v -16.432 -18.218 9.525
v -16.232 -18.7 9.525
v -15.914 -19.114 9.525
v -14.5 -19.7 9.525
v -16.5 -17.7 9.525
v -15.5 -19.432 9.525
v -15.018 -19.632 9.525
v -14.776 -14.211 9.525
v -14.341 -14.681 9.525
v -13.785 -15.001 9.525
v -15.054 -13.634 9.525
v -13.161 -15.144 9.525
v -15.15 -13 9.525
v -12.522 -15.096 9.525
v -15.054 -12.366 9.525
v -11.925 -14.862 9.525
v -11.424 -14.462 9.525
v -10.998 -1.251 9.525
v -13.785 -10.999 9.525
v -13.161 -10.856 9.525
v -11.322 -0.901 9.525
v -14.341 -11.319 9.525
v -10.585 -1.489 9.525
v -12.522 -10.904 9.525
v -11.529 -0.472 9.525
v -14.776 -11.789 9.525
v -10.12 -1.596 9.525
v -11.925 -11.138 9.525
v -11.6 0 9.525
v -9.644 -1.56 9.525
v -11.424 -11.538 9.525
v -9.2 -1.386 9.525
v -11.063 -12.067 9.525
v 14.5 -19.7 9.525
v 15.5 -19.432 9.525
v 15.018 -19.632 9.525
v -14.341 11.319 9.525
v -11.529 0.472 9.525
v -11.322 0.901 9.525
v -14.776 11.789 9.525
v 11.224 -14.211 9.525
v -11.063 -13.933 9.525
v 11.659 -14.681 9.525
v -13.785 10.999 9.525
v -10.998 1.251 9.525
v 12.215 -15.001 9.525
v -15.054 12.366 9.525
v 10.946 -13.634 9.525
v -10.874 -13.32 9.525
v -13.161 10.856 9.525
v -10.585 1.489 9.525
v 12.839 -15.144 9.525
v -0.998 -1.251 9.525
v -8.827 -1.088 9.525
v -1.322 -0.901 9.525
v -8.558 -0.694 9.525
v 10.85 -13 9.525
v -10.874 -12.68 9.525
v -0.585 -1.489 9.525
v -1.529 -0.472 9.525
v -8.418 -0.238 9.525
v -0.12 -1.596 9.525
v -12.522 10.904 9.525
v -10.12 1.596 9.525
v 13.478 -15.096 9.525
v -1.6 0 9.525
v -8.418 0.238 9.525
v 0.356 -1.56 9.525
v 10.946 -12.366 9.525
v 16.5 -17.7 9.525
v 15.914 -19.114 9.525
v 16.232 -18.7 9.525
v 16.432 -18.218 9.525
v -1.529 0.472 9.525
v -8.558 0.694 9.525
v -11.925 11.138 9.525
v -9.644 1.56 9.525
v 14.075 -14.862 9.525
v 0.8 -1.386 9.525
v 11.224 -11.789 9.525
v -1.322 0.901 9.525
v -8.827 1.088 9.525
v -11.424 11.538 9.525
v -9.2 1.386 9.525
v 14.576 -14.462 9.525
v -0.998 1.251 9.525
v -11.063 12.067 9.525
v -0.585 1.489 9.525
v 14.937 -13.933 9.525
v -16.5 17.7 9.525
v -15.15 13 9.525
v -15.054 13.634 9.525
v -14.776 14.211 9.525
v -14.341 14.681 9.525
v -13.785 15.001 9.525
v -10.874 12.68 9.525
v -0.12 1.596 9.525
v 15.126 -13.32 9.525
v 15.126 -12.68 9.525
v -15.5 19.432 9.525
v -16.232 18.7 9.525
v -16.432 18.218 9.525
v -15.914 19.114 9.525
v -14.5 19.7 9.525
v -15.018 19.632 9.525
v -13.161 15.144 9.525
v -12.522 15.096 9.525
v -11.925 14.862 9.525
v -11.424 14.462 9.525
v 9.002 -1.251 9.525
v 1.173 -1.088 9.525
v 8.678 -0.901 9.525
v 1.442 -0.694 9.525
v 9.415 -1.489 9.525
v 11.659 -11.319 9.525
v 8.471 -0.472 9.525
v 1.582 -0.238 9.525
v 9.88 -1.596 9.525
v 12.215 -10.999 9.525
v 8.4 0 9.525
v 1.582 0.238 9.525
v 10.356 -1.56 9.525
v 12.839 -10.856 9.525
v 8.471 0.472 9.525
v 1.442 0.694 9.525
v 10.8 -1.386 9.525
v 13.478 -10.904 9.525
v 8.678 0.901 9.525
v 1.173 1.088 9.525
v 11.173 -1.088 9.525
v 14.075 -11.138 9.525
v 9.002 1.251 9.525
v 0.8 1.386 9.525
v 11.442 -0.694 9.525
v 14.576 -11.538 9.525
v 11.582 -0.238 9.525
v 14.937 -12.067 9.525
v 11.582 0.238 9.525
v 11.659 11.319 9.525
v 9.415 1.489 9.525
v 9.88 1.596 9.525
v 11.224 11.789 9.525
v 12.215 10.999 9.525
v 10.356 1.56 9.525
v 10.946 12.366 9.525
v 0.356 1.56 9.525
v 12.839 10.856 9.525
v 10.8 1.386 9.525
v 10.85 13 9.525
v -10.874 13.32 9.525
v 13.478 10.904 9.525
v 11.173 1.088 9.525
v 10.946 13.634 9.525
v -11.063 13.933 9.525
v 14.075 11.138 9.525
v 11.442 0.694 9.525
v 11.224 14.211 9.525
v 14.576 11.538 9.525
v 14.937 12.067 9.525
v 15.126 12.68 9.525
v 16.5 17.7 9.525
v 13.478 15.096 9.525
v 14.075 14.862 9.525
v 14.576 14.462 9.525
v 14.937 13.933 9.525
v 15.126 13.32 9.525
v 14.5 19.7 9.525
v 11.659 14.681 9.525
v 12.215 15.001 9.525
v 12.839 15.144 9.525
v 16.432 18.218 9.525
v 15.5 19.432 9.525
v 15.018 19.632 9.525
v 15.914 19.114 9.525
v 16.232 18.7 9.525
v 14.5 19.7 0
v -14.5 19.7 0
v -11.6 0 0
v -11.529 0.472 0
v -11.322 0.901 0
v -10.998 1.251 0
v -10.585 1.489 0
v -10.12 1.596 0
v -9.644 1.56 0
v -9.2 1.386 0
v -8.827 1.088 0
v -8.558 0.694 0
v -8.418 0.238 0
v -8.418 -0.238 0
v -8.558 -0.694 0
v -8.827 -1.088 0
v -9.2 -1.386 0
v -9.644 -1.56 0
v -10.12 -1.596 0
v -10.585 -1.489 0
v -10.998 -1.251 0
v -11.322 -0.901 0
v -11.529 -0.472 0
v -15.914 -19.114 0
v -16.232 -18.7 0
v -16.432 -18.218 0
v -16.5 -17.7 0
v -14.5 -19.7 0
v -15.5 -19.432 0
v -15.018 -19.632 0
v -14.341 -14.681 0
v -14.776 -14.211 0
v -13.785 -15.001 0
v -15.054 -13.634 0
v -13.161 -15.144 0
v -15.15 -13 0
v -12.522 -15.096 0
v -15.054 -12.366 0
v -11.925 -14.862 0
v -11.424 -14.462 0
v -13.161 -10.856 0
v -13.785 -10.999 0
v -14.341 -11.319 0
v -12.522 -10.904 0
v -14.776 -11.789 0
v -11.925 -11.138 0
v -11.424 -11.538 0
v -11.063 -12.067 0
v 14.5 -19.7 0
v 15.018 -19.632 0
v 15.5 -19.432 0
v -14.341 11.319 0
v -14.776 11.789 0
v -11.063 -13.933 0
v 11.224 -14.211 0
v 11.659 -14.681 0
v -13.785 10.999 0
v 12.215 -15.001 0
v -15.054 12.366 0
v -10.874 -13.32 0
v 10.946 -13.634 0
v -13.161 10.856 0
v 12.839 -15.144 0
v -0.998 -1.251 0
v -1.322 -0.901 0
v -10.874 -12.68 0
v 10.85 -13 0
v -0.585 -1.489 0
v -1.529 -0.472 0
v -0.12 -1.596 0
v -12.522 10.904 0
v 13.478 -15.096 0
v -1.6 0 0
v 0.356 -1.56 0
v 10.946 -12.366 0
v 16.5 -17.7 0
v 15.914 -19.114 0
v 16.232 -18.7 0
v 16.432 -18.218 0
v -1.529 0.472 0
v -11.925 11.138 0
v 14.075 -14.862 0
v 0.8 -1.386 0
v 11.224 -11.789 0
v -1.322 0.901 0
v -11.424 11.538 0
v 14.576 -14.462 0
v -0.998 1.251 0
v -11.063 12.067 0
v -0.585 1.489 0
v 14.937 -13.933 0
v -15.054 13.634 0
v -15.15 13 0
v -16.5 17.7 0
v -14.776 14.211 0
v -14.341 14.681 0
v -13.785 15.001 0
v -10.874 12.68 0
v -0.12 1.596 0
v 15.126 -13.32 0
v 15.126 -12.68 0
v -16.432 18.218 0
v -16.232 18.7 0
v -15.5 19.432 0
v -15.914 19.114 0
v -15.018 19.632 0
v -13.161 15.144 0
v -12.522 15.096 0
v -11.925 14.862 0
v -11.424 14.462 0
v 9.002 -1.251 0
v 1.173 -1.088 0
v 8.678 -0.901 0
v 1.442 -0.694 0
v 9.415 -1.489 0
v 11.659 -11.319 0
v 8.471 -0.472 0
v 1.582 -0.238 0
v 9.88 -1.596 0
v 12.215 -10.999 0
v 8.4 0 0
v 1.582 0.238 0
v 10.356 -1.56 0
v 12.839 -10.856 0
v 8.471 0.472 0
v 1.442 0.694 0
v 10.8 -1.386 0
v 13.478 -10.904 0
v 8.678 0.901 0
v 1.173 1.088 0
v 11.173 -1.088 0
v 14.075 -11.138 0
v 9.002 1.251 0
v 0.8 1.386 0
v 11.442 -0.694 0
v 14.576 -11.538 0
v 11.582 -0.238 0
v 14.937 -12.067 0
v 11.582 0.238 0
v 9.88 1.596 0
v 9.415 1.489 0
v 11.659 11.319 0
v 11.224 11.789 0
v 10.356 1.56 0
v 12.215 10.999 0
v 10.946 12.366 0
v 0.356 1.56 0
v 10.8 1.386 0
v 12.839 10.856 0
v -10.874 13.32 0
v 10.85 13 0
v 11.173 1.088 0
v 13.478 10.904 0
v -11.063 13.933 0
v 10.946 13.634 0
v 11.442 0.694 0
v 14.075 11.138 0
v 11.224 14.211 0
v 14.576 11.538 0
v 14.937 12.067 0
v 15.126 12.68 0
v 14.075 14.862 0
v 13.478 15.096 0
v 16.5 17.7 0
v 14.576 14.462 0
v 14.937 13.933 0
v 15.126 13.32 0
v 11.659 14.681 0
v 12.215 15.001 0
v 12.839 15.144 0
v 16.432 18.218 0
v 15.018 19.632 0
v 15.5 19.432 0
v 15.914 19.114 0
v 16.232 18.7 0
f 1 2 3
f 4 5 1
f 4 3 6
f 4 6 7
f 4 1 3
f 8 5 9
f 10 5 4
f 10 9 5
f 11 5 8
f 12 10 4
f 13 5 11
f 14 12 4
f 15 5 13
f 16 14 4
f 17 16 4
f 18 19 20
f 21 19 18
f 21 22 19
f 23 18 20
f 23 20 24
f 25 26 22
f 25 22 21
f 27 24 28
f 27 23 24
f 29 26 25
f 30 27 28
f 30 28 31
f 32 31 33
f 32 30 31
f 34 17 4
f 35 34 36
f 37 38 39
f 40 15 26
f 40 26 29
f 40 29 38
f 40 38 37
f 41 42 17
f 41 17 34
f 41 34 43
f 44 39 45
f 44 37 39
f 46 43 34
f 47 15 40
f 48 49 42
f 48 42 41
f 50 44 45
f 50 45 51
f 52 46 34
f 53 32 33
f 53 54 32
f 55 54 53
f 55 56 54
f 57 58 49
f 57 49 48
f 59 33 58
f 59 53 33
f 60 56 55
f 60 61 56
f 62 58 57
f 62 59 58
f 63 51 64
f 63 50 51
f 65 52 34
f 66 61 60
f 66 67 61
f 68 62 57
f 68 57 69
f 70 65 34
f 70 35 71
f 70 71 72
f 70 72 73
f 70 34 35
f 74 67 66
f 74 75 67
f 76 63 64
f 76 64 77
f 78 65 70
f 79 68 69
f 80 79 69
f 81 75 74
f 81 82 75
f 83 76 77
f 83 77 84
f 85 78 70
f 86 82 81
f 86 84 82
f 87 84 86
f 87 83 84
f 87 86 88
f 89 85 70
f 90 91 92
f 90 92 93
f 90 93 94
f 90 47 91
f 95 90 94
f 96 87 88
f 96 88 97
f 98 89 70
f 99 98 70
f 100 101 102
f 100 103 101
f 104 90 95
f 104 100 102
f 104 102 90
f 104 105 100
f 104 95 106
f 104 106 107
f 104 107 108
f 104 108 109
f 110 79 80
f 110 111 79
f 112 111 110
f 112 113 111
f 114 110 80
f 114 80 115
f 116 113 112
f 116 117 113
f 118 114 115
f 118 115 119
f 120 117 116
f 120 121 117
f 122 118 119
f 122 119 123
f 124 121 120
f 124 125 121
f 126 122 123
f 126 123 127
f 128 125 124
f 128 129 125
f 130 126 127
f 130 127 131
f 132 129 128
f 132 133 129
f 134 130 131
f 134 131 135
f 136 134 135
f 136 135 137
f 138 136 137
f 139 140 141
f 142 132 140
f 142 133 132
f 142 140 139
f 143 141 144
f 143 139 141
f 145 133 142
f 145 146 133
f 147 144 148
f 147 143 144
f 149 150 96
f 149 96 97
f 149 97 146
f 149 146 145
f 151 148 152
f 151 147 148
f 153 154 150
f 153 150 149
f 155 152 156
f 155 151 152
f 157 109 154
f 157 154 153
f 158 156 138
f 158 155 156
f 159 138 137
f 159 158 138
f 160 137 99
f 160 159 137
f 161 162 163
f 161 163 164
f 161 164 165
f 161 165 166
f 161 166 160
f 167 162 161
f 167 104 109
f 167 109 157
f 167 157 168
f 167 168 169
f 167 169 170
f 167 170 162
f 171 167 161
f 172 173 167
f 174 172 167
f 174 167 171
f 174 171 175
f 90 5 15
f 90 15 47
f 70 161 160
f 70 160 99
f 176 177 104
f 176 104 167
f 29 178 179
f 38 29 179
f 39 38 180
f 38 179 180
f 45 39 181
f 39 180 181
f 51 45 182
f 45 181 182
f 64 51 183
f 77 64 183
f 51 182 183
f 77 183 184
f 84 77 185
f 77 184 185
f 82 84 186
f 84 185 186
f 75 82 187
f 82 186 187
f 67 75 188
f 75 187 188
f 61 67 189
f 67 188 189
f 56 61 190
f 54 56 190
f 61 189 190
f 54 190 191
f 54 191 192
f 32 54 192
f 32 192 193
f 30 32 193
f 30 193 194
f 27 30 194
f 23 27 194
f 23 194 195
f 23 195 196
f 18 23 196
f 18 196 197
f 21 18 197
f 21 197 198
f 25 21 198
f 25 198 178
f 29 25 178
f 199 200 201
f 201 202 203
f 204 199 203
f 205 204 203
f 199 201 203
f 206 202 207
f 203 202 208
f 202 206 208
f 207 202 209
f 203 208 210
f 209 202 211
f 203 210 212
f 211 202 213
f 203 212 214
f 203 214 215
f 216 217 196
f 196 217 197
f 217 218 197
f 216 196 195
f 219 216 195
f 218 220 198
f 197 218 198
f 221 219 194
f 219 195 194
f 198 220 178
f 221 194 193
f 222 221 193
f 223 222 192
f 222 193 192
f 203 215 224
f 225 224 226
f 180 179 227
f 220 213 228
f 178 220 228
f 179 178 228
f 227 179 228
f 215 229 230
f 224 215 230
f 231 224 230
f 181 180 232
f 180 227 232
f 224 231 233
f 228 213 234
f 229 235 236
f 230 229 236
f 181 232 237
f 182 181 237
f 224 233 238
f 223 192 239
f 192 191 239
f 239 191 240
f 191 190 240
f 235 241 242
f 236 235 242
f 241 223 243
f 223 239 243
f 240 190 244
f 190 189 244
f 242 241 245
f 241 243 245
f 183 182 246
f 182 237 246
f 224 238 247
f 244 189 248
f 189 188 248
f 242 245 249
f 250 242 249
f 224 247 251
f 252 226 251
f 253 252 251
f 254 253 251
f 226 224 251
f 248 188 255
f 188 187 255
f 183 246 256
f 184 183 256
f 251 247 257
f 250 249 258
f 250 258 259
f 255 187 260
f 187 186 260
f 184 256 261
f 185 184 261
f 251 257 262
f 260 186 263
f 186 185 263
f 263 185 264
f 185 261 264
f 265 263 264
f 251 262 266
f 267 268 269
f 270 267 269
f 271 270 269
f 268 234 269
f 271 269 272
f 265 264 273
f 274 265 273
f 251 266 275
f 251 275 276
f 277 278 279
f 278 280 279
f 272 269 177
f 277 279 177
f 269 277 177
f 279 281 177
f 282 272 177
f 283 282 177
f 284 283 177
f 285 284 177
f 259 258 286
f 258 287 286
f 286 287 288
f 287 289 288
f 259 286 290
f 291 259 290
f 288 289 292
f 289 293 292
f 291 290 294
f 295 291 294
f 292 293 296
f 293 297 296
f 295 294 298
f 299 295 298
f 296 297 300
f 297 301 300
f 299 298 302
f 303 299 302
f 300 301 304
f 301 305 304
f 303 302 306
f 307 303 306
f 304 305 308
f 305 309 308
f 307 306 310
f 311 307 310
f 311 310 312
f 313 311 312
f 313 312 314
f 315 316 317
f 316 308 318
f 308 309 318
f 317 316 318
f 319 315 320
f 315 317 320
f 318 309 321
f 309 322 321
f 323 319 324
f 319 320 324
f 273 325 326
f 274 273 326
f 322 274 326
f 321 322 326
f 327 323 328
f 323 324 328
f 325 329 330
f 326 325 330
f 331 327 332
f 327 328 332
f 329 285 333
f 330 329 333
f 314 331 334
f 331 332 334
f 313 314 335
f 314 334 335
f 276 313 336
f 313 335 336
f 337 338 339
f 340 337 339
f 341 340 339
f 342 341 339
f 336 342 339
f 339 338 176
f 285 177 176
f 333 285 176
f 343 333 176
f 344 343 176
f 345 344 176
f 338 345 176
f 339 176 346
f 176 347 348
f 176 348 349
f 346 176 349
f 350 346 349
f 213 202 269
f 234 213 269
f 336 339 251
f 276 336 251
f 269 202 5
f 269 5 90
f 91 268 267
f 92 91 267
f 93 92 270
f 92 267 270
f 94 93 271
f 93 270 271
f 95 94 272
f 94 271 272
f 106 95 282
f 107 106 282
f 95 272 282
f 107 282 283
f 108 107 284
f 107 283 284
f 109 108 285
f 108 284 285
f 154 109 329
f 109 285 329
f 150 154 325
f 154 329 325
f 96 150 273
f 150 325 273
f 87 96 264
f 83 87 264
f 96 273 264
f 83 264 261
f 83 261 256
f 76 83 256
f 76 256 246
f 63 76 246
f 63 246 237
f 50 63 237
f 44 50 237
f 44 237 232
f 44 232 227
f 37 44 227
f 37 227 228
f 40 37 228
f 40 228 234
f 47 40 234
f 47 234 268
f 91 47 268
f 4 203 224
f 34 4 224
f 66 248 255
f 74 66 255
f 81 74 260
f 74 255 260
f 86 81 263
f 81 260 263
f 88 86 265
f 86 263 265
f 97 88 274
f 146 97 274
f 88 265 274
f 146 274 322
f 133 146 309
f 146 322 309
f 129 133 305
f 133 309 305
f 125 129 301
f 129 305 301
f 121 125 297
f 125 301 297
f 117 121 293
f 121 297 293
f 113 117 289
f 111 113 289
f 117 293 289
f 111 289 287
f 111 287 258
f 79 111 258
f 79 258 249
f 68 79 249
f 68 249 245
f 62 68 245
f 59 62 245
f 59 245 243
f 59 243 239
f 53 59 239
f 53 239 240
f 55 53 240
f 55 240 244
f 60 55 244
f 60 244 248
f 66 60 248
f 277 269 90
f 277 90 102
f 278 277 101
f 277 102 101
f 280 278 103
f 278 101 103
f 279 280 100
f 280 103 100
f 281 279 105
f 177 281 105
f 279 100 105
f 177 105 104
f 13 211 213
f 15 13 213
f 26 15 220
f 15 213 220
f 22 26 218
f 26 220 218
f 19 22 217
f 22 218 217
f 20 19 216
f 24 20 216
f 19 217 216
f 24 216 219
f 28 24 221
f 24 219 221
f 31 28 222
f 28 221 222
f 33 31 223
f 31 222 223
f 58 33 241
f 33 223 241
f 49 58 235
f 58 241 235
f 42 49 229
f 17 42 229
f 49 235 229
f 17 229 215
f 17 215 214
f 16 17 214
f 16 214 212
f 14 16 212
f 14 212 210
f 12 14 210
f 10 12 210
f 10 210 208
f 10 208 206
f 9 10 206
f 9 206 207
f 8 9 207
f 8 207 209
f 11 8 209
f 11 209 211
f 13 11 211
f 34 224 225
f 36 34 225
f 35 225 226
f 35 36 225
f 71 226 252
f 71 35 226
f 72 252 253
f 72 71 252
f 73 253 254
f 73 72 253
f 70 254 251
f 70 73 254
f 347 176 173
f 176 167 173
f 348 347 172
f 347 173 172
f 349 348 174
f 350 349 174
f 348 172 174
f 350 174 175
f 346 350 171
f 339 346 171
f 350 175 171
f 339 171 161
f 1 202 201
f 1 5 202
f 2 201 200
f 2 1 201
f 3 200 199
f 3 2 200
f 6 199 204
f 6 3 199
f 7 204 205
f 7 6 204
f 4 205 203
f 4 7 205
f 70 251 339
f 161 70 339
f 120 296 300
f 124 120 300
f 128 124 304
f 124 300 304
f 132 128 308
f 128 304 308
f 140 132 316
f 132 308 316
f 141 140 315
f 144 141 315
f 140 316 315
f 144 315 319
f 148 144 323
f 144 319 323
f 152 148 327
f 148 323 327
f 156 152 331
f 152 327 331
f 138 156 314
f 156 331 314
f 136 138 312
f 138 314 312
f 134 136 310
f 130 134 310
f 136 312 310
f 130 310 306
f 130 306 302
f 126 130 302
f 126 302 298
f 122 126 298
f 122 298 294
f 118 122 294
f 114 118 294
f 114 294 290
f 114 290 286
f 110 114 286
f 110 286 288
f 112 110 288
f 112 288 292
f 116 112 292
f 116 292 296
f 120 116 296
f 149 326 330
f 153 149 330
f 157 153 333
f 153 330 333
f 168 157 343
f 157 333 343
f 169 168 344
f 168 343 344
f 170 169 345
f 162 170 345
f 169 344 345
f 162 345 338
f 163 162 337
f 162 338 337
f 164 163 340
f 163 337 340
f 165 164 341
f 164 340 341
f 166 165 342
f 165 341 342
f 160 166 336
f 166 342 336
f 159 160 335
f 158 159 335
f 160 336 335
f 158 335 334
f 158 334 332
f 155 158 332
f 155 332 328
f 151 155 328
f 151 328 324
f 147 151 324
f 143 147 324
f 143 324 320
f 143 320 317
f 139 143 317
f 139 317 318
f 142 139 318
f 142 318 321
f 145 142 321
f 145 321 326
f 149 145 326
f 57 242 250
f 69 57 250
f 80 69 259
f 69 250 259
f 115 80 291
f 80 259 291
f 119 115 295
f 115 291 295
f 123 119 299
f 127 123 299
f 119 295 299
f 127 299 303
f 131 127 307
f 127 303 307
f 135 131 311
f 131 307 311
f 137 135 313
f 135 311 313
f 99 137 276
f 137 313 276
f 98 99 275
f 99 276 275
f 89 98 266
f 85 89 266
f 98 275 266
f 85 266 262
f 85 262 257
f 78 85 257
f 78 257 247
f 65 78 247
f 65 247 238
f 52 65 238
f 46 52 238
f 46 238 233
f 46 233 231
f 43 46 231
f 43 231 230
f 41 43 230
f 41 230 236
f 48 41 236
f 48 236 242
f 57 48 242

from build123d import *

# Parameters (mm, degrees)
SKETCH1_W            = 33
SKETCH1_H            = 39.4
BOSS_EXTRUDE1_DEPTH  = 9.525
M3_CLEARANCE_HOLE1_D = 3.2
M4_CLEARANCE_HOLE1_D = 4.3
FILLET1_R            = 2


with BuildPart() as part:
    # Sketch1 → Boss-Extrude1 (new body)
    with BuildSketch(Plane.XY):
        Rectangle(SKETCH1_W, SKETCH1_H)
    extrude(amount=BOSS_EXTRUDE1_DEPTH)

    # M3 Clearance Hole1 (through all)
    with Locations(Plane.XY.offset(9.525)):
        with Locations((-10, 0), (0, 0), (10, 0)):
            Hole(M3_CLEARANCE_HOLE1_D / 2)

    # M4 Clearance Hole1 (through all)
    with Locations(Plane.XY.offset(9.525)):
        with Locations((-13, 13), (-13, -13), (13, -13), (13, 13)):
            Hole(M4_CLEARANCE_HOLE1_D / 2)

    # Fillet1
    fillet1_edges = [part.edges().sort_by_distance(p)[0] for p in [
        (-16.5, 19.7, 4.7625),
        (16.5, 19.7, 4.7625),
        (16.5, -19.7, 4.7625),
        (-16.5, -19.7, 4.7625),
    ]]
    fillet(fillet1_edges, radius=FILLET1_R)


solid = part.part
